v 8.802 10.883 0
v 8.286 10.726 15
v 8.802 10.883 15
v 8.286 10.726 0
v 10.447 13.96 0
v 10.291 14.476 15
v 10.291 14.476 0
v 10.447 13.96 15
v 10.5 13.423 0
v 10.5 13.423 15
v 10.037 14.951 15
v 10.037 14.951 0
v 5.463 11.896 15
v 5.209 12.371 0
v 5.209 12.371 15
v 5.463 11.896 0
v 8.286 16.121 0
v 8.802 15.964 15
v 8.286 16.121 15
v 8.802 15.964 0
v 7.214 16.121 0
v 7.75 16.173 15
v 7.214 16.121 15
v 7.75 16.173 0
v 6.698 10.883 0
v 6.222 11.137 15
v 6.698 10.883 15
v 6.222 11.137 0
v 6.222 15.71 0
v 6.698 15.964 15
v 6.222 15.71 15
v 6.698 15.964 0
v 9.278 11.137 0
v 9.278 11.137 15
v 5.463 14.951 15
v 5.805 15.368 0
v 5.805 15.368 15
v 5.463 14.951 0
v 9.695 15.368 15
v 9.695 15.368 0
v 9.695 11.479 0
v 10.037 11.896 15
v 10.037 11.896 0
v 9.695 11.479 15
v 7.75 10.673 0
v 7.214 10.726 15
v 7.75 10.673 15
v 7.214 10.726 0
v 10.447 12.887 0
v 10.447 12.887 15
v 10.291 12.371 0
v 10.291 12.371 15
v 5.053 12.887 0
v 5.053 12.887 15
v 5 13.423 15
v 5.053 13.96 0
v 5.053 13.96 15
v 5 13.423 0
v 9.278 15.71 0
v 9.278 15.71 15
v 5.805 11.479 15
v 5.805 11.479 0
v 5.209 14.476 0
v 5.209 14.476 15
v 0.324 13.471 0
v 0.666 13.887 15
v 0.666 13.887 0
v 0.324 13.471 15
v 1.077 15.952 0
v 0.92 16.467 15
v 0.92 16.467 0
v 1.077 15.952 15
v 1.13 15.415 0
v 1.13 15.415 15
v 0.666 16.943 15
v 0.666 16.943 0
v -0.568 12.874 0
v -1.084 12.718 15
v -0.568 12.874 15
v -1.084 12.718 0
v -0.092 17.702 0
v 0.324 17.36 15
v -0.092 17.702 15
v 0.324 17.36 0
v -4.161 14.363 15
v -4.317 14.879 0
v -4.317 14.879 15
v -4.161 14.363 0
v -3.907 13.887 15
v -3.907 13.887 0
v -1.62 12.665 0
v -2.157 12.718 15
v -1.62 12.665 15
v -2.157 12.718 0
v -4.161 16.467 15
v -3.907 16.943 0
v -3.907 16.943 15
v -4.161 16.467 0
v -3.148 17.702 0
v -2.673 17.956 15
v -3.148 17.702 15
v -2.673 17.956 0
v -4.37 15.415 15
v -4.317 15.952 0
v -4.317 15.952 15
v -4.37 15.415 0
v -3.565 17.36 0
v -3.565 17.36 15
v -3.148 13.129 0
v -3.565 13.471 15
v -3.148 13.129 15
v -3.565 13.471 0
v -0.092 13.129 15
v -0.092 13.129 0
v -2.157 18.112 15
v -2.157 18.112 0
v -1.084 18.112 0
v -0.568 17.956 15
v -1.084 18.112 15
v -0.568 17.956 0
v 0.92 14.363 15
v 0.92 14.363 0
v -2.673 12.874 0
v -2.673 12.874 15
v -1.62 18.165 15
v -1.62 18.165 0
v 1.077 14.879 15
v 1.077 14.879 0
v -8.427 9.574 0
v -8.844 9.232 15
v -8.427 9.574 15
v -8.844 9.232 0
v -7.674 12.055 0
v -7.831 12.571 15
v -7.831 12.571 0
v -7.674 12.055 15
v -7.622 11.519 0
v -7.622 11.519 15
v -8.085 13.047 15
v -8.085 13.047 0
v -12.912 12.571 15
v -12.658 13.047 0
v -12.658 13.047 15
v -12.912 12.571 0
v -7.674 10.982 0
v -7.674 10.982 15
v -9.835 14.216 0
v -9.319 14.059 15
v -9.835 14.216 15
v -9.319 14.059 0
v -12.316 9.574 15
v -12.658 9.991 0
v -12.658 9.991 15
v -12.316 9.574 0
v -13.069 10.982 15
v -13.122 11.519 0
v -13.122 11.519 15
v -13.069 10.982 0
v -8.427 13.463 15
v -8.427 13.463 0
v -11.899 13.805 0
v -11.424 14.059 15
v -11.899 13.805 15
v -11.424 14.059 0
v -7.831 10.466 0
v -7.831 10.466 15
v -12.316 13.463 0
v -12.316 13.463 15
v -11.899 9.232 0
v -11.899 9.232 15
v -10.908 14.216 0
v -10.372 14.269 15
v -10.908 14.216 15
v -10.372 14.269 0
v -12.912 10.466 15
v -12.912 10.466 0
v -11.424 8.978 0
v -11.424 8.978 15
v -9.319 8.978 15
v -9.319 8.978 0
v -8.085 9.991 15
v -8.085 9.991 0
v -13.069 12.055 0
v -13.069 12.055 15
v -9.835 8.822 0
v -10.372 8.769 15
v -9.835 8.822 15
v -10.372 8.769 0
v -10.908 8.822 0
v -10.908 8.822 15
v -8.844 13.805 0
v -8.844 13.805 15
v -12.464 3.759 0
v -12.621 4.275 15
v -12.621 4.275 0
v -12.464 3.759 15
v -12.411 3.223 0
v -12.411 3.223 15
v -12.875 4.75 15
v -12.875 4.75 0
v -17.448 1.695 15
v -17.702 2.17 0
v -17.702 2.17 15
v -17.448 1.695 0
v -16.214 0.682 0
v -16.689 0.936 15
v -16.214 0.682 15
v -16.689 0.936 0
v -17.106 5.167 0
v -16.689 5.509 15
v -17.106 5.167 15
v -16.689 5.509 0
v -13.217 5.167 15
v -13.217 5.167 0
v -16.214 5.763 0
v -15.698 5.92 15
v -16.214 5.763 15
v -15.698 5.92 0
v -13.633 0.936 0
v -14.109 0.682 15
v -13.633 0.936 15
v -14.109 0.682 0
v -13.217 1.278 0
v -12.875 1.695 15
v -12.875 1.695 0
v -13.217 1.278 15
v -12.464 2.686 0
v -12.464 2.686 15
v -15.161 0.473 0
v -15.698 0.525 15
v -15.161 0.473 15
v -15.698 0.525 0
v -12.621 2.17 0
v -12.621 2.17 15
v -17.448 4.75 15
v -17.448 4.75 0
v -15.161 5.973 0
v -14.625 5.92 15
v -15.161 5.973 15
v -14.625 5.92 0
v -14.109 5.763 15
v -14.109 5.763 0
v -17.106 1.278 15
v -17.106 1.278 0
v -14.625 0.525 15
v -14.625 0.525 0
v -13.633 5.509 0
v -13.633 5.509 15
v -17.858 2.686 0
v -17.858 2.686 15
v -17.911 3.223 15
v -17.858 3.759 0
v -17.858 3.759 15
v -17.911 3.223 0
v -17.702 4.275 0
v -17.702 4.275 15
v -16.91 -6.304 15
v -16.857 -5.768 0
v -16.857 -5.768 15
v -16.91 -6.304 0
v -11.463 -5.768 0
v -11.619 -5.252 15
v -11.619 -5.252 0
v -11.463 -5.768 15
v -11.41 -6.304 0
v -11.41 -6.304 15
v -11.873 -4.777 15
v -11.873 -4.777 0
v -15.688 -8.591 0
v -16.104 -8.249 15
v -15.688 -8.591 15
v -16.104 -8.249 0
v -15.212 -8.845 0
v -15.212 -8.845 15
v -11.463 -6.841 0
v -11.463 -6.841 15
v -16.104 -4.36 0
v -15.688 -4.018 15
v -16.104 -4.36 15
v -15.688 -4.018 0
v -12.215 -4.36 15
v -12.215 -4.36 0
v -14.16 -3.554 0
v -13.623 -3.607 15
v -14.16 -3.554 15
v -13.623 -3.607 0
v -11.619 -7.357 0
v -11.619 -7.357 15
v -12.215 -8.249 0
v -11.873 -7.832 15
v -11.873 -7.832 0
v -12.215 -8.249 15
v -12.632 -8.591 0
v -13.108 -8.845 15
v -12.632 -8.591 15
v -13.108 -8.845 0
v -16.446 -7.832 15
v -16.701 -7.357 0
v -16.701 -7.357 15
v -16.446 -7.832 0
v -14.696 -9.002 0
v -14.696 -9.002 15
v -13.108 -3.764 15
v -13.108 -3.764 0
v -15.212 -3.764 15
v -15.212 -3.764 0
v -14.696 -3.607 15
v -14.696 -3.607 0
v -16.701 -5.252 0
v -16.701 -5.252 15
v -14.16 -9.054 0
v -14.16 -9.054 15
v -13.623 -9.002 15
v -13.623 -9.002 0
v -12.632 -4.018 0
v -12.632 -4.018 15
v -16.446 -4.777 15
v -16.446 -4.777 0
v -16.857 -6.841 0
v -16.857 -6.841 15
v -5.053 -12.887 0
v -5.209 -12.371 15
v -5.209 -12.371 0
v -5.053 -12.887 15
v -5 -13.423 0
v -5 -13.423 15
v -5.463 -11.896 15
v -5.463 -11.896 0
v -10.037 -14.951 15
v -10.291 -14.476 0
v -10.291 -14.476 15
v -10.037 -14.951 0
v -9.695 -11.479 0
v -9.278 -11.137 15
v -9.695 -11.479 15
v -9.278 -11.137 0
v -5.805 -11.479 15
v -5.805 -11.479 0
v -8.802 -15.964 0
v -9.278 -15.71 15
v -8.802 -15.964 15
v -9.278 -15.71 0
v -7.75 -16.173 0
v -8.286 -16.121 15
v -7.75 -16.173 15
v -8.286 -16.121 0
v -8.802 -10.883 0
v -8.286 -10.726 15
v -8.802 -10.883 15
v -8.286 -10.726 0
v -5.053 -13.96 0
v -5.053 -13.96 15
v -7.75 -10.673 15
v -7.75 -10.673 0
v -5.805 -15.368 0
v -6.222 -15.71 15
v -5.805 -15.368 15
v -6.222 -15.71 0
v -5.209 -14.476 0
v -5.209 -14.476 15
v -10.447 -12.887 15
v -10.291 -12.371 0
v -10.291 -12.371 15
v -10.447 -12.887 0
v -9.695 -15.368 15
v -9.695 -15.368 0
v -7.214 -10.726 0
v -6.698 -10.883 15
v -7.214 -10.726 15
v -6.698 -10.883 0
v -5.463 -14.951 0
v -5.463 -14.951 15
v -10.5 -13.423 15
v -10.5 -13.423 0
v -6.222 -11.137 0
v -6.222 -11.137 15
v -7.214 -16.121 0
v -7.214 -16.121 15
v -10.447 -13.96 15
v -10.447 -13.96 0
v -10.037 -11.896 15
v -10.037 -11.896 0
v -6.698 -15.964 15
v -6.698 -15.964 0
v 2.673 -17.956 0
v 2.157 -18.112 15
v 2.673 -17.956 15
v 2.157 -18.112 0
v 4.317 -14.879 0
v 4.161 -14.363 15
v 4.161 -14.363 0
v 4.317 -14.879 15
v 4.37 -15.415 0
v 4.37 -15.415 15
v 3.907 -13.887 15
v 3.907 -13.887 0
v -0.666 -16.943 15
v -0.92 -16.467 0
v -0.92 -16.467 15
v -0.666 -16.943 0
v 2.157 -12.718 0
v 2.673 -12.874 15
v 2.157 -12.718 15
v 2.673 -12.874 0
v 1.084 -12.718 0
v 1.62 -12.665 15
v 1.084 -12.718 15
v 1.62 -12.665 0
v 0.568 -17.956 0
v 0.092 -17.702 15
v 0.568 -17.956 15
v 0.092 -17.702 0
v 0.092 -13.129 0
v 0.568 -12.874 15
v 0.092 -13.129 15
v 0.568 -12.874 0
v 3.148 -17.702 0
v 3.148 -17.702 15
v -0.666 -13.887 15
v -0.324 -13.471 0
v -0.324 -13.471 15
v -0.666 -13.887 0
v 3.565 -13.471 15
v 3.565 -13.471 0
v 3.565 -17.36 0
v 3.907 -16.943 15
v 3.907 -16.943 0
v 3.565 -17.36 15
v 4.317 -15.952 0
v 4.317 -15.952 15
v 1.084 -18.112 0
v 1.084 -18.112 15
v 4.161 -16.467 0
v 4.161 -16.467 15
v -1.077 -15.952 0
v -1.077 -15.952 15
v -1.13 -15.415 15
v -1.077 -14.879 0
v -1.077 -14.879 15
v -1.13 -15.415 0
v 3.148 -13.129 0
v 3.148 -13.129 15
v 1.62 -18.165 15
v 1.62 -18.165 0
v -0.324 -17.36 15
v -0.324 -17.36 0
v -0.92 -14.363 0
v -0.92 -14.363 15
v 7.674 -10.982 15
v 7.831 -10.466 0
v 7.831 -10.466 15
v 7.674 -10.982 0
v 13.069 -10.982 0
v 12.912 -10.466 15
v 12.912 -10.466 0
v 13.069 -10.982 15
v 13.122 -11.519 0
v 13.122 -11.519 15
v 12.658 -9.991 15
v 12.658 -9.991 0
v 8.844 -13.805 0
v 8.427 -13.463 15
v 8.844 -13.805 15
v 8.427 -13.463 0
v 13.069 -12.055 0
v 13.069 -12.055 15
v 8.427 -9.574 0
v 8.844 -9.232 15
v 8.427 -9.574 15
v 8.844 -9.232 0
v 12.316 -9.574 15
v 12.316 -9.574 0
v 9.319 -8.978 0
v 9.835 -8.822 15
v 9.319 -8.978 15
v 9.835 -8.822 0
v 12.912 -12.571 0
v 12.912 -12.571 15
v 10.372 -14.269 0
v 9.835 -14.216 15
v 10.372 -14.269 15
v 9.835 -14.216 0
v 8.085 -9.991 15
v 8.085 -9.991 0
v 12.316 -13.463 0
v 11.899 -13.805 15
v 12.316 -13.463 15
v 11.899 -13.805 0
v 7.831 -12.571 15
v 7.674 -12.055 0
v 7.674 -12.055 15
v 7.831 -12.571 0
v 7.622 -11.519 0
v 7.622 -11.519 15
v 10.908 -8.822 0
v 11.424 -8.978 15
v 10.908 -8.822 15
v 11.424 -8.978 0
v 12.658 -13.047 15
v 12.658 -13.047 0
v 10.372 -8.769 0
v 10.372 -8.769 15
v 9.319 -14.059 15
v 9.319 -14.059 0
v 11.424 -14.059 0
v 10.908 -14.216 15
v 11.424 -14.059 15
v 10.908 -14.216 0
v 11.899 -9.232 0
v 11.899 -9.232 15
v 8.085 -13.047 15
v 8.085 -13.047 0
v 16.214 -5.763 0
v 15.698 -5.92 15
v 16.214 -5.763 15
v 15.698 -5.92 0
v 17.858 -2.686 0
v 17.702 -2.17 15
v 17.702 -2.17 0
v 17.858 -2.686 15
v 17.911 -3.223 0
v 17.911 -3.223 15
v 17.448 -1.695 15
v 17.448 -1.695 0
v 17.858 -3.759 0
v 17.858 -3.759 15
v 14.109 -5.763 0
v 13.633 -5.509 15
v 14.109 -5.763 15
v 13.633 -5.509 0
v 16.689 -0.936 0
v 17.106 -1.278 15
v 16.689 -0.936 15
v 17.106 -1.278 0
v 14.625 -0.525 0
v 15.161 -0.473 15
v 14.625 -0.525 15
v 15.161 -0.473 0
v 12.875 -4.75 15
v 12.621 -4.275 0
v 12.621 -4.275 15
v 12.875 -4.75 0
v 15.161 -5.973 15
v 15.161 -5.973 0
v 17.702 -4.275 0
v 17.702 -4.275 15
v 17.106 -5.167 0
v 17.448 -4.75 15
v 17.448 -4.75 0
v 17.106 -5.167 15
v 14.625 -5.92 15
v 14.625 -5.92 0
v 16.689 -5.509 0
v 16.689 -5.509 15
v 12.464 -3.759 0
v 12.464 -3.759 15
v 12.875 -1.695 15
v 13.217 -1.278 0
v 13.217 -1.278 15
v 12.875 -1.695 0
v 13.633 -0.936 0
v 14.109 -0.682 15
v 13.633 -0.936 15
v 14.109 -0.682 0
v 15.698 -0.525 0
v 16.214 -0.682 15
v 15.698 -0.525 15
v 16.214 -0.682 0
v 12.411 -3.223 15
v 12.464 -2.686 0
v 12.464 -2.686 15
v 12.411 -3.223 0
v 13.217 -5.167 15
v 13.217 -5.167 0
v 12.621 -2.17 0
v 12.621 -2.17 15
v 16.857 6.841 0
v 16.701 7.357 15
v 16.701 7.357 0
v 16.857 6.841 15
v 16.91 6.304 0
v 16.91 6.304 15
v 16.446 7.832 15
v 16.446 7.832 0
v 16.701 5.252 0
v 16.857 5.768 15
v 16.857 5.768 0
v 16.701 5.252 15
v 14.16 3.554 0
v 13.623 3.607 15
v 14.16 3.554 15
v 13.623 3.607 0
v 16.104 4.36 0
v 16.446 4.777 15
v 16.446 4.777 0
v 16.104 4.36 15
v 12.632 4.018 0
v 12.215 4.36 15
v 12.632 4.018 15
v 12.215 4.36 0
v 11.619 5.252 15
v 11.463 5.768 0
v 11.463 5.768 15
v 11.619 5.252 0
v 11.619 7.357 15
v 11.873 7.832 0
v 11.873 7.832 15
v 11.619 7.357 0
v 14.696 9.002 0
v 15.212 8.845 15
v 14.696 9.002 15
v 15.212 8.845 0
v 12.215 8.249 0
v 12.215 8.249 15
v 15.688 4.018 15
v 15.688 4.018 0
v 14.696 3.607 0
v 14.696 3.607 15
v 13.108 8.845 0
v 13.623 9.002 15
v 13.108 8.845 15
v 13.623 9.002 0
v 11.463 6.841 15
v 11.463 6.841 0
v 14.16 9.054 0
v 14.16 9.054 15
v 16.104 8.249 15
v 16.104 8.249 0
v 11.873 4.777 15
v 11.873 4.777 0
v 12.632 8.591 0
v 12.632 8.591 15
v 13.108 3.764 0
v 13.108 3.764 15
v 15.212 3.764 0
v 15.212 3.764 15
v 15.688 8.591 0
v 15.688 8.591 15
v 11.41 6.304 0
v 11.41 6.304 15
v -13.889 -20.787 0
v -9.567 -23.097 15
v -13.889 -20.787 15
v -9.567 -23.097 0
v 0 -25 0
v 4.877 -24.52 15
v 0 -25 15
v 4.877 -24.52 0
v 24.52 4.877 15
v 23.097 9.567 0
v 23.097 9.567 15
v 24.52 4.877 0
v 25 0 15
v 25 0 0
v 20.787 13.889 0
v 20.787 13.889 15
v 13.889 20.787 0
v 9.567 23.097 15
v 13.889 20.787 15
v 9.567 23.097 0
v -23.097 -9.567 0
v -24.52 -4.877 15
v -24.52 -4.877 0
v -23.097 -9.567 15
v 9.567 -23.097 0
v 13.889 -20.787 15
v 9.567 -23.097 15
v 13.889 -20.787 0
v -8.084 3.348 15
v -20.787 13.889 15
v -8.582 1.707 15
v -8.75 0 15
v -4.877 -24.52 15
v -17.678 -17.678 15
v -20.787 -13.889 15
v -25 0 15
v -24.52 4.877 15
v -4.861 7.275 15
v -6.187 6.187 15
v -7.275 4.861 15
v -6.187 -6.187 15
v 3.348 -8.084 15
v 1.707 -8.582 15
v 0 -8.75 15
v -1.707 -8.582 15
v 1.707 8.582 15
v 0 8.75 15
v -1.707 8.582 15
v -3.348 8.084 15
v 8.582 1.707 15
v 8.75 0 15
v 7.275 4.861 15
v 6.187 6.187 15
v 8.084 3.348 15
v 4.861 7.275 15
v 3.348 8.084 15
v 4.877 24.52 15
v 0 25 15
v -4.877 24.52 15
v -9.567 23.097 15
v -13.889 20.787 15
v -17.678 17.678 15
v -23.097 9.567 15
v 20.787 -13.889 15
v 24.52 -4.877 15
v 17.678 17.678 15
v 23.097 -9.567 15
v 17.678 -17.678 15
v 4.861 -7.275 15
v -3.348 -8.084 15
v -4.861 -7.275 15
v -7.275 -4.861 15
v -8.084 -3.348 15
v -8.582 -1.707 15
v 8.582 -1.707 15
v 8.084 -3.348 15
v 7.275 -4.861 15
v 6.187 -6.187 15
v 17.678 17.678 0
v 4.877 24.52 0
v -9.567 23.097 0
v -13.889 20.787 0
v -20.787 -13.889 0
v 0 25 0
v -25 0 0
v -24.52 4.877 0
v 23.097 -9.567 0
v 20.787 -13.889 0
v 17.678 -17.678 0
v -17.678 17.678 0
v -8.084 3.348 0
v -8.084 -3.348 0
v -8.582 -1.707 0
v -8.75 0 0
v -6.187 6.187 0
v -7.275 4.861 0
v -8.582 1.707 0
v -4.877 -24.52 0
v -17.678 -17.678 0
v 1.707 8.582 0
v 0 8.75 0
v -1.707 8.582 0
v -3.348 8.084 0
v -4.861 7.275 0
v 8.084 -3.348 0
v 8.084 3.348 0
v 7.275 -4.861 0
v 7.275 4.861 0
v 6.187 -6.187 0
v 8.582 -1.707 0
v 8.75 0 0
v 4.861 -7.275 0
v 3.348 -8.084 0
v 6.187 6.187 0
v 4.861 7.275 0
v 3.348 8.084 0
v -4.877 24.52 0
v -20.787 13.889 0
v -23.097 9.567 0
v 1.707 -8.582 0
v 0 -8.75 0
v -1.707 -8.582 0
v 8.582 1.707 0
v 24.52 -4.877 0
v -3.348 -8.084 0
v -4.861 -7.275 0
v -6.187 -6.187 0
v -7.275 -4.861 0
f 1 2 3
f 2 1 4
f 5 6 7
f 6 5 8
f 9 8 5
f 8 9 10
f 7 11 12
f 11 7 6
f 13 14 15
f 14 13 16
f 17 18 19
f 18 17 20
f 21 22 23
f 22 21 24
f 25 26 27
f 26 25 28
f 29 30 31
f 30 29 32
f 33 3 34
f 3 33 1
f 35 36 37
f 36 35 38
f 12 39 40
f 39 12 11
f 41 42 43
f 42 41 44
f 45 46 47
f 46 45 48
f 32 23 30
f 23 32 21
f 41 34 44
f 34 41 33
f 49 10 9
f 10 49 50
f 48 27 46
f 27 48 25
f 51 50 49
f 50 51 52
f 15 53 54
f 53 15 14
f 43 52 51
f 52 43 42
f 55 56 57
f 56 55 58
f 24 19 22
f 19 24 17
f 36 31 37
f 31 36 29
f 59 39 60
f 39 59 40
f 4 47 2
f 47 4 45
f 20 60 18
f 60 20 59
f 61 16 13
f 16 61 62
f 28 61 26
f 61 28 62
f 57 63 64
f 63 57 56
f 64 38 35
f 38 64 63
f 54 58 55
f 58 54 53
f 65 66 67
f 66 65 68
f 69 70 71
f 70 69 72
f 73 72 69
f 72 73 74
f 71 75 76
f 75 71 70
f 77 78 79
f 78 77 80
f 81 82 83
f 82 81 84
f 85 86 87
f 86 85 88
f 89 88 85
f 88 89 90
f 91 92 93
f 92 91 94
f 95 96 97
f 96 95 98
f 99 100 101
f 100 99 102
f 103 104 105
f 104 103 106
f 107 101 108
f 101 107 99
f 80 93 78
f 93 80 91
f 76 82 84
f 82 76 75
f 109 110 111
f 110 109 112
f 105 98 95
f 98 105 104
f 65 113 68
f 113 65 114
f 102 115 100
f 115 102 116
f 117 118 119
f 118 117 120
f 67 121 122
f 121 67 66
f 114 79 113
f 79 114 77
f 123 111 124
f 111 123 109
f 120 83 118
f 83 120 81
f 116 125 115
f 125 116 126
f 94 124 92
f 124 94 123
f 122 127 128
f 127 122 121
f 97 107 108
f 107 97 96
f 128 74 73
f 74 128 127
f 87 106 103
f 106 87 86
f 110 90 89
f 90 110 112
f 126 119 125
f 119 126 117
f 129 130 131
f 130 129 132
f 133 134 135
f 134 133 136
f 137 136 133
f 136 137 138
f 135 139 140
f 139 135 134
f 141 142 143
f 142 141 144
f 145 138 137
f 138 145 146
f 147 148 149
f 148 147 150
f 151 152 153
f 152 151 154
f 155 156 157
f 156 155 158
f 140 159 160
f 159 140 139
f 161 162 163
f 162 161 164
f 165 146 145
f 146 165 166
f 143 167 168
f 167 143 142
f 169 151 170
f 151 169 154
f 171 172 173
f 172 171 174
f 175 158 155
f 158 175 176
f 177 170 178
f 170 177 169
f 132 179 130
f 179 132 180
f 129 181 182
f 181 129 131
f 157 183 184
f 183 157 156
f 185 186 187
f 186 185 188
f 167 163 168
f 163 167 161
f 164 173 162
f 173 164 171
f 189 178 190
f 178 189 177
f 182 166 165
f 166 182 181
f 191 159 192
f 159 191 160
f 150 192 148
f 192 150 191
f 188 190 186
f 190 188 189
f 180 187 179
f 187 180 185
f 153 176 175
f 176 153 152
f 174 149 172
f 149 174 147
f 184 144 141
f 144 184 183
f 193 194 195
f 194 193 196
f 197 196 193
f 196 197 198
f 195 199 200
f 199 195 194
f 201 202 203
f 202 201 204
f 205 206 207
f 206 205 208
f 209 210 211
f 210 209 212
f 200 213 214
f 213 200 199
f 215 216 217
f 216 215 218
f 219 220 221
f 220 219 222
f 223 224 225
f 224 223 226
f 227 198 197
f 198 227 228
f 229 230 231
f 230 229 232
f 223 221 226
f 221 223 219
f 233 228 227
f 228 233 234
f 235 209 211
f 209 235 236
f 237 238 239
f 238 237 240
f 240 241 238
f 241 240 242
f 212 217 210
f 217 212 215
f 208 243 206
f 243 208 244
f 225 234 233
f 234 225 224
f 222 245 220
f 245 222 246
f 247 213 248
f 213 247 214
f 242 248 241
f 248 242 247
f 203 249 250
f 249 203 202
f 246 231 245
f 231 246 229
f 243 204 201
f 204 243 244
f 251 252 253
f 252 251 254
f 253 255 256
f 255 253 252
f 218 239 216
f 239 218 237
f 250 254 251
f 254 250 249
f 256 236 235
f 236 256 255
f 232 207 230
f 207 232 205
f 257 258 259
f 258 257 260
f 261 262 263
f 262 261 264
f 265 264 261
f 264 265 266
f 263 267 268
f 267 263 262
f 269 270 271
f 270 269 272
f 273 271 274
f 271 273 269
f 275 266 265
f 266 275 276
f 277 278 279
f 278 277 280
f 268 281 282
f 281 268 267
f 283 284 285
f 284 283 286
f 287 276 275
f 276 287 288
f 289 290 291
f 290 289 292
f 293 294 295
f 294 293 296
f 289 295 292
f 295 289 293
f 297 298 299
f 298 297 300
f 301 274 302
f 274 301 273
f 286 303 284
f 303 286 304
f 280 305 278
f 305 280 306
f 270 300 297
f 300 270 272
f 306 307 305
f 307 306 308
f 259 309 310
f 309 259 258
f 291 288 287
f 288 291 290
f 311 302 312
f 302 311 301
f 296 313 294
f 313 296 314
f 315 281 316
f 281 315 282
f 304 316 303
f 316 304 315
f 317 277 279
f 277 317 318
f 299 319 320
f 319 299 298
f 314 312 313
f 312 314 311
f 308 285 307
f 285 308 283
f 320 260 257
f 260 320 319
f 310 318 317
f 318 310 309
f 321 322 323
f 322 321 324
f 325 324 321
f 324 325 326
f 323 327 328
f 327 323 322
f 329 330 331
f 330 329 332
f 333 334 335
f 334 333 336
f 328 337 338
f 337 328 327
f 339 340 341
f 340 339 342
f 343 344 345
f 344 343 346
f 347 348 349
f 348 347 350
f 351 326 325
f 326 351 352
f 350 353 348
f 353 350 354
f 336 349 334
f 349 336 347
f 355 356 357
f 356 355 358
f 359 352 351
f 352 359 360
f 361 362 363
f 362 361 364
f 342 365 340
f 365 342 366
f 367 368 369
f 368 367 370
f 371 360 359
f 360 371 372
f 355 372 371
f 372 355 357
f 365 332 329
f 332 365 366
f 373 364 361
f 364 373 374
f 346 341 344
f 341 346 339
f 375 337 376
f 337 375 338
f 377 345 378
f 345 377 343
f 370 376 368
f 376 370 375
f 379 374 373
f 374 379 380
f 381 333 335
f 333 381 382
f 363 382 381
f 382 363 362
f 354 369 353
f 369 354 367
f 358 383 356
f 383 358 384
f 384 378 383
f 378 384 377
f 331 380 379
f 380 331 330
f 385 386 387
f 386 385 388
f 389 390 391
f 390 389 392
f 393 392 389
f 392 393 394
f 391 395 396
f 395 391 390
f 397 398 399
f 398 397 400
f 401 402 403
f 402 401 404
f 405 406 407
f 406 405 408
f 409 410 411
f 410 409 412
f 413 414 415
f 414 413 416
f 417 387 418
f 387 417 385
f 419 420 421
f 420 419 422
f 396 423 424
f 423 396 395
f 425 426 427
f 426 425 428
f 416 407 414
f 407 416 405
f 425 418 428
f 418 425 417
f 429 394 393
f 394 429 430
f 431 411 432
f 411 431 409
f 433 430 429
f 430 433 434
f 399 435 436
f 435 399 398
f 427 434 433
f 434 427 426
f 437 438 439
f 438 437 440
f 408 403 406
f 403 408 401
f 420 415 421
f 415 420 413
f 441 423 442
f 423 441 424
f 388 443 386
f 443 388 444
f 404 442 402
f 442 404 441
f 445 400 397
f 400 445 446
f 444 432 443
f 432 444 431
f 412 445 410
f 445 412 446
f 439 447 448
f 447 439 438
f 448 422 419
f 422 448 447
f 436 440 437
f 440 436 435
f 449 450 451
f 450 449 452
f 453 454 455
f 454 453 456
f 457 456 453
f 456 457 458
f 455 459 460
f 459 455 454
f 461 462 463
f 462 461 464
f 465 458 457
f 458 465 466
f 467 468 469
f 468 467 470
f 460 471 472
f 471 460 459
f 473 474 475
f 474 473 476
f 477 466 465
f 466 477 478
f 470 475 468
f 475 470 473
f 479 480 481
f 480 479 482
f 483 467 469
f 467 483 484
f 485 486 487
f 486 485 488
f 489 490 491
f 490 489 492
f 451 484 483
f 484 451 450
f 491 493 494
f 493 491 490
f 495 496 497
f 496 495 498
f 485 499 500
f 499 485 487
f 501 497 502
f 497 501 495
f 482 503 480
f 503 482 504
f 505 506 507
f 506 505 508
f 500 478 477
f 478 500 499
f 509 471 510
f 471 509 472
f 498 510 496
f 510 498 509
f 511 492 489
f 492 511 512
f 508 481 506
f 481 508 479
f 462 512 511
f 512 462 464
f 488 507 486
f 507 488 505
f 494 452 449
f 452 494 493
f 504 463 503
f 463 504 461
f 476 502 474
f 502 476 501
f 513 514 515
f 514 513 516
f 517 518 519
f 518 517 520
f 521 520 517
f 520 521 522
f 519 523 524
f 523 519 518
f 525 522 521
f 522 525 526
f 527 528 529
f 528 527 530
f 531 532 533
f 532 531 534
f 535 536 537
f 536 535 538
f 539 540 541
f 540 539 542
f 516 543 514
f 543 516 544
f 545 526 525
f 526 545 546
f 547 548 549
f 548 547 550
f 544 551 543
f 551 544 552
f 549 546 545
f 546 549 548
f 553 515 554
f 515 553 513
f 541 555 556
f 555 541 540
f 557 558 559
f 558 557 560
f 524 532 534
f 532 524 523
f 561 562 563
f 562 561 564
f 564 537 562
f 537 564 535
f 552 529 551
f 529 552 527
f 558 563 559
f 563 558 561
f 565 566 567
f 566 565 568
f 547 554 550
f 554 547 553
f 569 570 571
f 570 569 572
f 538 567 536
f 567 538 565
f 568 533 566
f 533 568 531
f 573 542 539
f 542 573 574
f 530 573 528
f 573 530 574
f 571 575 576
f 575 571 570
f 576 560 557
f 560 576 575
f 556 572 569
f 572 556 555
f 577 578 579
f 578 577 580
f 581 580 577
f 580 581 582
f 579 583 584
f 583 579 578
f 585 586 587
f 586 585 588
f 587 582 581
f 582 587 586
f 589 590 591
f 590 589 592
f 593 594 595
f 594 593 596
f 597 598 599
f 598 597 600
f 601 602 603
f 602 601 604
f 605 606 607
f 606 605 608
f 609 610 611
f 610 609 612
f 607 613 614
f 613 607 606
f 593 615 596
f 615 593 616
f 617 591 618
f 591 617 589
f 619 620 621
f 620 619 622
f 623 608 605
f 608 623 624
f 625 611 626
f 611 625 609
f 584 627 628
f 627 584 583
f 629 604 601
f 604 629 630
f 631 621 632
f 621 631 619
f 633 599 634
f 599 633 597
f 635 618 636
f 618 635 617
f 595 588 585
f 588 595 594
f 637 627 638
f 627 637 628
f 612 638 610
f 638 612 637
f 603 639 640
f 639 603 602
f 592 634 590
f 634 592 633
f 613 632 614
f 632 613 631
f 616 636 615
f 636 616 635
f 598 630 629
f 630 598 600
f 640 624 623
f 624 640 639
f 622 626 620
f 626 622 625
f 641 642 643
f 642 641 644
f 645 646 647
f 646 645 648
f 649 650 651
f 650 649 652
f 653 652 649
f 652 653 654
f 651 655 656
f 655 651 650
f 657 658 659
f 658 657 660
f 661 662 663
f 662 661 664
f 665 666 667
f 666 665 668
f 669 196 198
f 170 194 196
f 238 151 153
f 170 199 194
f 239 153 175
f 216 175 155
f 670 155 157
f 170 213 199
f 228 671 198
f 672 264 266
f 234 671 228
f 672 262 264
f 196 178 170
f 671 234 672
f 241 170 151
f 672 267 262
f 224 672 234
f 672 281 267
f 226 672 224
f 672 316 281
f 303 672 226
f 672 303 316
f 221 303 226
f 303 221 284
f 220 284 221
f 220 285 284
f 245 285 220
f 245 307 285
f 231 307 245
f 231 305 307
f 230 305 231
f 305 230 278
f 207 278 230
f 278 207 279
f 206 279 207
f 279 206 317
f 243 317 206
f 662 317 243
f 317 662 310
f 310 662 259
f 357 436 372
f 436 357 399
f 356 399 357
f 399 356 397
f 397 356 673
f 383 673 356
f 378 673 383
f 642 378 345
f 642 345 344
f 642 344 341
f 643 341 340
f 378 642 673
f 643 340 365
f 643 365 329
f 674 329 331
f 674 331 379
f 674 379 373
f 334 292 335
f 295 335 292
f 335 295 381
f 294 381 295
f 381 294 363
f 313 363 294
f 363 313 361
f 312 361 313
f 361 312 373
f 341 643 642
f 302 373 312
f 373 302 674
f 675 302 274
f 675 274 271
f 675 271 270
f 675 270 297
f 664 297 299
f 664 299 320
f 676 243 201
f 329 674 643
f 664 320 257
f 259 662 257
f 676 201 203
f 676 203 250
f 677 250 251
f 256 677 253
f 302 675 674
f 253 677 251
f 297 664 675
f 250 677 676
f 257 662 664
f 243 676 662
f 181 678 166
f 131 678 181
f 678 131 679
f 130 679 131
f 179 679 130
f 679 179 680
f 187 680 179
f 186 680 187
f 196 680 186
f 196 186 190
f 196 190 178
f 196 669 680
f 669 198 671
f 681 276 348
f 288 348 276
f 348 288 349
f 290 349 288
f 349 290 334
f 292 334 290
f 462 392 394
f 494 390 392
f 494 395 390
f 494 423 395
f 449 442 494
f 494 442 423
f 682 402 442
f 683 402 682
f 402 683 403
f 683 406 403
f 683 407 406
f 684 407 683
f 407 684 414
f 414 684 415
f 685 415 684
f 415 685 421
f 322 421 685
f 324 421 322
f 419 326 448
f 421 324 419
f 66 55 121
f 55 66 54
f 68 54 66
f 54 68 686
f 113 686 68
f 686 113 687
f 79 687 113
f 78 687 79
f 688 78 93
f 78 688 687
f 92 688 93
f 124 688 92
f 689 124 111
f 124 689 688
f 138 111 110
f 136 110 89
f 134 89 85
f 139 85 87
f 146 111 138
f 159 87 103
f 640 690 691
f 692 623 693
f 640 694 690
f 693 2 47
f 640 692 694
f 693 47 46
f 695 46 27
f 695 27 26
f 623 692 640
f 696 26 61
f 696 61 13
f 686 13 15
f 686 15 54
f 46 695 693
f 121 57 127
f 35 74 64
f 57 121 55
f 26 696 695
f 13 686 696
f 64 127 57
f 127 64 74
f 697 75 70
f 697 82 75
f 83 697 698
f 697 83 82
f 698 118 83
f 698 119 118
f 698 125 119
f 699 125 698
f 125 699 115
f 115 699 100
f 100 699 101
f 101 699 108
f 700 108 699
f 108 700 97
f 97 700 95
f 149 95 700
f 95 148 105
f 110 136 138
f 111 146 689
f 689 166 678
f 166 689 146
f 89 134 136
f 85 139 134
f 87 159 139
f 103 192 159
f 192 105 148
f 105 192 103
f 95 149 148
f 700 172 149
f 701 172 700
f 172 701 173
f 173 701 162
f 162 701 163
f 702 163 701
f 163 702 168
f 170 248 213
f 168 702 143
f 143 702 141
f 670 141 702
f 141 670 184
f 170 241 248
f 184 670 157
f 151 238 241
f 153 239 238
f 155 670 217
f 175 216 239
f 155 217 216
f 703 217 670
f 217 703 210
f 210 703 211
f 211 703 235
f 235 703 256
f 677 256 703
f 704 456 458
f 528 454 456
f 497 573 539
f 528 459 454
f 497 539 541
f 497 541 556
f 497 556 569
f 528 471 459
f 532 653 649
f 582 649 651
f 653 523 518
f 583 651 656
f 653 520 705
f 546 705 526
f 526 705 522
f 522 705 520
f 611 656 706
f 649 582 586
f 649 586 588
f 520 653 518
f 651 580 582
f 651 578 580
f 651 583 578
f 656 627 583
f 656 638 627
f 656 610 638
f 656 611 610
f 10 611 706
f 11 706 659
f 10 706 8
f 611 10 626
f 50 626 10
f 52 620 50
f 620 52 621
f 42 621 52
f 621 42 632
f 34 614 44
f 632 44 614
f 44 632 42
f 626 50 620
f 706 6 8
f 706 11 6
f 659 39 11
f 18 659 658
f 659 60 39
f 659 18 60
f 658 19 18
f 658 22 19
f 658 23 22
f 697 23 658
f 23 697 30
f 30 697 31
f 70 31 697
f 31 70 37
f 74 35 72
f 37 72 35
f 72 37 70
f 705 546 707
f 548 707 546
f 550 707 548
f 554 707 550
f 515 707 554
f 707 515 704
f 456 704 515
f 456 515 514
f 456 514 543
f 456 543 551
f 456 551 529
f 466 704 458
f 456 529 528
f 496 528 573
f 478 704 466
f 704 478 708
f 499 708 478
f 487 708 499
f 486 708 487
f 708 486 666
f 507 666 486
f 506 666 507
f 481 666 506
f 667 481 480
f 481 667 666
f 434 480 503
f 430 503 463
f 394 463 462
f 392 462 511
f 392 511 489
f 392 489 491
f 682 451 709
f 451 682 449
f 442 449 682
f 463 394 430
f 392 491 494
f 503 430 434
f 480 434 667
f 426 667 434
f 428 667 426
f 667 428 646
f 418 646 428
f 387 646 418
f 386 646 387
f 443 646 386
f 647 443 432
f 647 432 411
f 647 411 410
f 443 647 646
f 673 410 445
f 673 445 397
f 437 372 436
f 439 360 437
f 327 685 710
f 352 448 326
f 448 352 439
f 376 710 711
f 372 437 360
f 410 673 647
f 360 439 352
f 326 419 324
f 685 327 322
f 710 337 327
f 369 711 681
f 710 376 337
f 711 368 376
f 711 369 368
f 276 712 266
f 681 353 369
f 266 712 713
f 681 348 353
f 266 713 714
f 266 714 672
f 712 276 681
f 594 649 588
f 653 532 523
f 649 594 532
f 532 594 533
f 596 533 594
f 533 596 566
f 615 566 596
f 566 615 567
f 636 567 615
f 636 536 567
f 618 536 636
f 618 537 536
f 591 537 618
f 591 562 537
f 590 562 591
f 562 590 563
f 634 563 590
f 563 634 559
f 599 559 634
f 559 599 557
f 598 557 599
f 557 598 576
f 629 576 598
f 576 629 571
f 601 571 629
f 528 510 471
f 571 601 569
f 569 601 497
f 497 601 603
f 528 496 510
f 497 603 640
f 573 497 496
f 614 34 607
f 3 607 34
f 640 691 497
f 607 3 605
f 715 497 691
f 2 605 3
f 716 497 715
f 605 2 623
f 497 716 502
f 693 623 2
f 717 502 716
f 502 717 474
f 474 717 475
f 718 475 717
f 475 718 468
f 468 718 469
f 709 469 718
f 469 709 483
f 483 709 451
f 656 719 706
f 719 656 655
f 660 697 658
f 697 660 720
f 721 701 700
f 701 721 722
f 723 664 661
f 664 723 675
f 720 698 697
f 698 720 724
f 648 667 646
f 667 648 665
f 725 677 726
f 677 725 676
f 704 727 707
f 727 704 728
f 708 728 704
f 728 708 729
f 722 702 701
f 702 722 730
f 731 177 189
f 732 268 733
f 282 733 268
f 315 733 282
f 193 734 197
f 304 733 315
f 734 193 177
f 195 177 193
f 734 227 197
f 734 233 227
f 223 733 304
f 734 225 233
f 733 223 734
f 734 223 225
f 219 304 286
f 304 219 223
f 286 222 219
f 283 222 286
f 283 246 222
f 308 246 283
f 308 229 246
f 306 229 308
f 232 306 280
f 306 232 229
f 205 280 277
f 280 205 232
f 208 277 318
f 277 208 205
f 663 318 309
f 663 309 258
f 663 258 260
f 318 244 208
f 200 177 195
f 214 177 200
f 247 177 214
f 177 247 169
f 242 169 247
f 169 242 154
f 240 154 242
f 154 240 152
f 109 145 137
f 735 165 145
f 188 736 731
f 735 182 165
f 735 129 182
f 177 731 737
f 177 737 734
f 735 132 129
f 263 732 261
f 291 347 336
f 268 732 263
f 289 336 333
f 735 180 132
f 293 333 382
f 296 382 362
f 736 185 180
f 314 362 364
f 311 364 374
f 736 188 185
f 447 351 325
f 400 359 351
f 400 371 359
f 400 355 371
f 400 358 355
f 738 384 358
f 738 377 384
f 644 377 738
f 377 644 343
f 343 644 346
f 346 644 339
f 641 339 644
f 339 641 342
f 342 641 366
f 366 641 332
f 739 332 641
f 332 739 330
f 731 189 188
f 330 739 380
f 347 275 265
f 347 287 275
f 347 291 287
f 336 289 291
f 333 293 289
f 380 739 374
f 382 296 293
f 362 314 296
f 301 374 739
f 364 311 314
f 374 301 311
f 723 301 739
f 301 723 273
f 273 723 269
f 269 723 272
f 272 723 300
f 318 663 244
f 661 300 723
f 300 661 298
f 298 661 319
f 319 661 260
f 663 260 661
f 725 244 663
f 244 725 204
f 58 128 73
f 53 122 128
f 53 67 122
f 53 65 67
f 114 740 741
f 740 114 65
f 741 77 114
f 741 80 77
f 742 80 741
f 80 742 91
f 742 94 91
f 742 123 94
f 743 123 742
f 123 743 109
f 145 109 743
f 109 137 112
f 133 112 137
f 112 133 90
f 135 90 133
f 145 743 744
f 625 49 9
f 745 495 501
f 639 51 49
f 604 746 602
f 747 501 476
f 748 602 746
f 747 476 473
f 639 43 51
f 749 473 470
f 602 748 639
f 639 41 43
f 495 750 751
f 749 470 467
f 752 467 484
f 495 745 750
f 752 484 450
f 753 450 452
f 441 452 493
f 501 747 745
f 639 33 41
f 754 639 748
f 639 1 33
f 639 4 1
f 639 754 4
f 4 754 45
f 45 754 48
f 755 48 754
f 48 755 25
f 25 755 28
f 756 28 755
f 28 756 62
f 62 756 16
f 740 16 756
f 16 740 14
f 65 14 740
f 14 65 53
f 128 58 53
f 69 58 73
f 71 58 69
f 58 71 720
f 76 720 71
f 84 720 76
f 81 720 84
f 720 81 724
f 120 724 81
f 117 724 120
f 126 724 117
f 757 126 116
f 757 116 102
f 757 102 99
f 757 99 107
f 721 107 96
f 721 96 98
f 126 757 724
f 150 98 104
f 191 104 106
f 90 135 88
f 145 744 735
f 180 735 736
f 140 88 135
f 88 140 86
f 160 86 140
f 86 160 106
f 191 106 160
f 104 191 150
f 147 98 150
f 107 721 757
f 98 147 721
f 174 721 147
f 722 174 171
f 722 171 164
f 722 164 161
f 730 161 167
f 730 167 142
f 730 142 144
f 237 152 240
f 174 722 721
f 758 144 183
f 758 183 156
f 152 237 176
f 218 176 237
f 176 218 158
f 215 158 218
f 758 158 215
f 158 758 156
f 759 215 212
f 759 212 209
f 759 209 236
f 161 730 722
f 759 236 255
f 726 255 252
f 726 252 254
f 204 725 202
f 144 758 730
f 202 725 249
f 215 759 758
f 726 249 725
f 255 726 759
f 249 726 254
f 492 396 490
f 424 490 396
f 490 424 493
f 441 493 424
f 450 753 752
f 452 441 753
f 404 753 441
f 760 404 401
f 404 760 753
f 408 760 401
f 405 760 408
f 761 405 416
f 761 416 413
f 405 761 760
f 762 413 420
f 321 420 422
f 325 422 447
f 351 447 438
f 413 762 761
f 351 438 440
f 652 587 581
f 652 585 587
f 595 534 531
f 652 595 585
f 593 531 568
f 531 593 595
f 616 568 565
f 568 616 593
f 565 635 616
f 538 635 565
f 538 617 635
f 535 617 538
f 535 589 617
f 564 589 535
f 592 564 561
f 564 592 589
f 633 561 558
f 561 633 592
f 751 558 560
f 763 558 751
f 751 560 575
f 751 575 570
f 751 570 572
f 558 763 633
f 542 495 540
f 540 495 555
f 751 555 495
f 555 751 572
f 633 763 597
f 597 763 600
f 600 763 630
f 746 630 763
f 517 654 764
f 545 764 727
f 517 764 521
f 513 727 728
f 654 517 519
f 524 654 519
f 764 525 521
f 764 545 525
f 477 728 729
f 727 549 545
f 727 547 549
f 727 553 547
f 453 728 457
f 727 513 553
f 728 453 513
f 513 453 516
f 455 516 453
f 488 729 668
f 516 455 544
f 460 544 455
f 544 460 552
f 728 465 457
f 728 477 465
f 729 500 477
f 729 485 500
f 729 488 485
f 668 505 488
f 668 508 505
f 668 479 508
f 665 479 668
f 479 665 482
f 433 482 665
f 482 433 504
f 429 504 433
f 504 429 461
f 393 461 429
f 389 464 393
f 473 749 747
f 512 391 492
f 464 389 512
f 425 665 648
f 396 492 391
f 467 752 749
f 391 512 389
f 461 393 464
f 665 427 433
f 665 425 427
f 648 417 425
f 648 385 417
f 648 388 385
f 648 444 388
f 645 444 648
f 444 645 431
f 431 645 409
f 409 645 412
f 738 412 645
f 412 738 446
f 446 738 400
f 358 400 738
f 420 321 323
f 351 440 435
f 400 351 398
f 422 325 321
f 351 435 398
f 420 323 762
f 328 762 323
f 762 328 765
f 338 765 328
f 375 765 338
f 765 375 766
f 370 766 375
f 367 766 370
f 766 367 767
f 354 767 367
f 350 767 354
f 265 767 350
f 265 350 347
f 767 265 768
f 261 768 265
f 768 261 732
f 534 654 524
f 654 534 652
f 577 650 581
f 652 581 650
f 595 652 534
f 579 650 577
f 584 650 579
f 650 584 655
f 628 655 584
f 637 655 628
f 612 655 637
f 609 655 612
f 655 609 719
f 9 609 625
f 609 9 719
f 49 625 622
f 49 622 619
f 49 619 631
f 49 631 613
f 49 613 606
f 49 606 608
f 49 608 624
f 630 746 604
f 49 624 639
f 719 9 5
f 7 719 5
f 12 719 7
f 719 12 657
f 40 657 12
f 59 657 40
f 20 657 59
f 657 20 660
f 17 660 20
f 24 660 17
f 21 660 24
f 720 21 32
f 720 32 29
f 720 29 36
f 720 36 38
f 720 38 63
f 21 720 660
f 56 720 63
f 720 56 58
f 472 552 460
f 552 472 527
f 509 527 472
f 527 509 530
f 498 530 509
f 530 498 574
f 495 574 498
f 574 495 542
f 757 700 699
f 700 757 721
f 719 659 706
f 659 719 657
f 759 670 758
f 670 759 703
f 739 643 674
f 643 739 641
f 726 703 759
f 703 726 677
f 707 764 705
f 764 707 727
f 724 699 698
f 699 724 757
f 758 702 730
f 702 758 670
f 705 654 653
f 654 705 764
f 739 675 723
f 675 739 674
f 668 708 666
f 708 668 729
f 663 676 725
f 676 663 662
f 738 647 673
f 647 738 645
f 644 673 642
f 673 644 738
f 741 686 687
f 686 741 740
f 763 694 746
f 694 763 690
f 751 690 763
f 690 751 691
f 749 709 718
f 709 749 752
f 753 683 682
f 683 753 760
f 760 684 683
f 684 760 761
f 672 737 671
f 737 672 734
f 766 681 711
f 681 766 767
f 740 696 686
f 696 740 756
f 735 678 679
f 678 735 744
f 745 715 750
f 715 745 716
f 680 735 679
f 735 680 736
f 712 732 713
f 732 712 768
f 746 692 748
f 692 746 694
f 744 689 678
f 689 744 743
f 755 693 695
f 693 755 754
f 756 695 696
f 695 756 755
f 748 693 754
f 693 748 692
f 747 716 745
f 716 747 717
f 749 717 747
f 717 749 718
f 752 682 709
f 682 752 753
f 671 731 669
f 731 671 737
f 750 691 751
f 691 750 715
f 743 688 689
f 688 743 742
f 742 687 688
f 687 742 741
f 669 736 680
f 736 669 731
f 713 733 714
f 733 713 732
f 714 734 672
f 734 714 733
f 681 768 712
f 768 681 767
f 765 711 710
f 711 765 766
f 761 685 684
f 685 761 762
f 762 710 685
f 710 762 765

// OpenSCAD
$fn = 32;

// ----------------------------------------------------------------------
// Flange Ø50 x 15
// 10 holes on a Ø31 bolt circle, bolted joints
// ----------------------------------------------------------------------

// --- parameters (mm) ---
flange_d = 50;   // outside diameter of the flange
thickness = 15;  // flange thickness
holes = 10;      // number of bolt holes
pcd = 31;        // bolt circle diameter
start_deg = 60;  // angle of the first hole, from +X
hole_d = 5.5;    // bolt hole diameter
bore_d = 17.5;   // central through bore
hub_d = 25.5;    // hub outside diameter
hub_h = 0;       // hub height above the flange face (0 = no hub)

// --- derived feature positions (mm) ---
height = thickness + hub_h;  // = 15   overall height of the part
pcd_r = pcd / 2;             // = 15.5   bolt circle radius
hole_step = 360 / holes;     // = 36   angular pitch
feature_centers = [
  [pcd_r * cos(start_deg + 0 * hole_step), pcd_r * sin(start_deg + 0 * hole_step)],
  [pcd_r * cos(start_deg + 1 * hole_step), pcd_r * sin(start_deg + 1 * hole_step)],
  [pcd_r * cos(start_deg + 2 * hole_step), pcd_r * sin(start_deg + 2 * hole_step)],
  [pcd_r * cos(start_deg + 3 * hole_step), pcd_r * sin(start_deg + 3 * hole_step)],
  [pcd_r * cos(start_deg + 4 * hole_step), pcd_r * sin(start_deg + 4 * hole_step)],
  [pcd_r * cos(start_deg + 5 * hole_step), pcd_r * sin(start_deg + 5 * hole_step)],
  [pcd_r * cos(start_deg + 6 * hole_step), pcd_r * sin(start_deg + 6 * hole_step)],
  [pcd_r * cos(start_deg + 7 * hole_step), pcd_r * sin(start_deg + 7 * hole_step)],
  [pcd_r * cos(start_deg + 8 * hole_step), pcd_r * sin(start_deg + 8 * hole_step)],
  [pcd_r * cos(start_deg + 9 * hole_step), pcd_r * sin(start_deg + 9 * hole_step)]
];   // bolt hole centres on the pitch circle

// flange disc, every hole and the bore cut straight through
difference() {
  union() {
    cylinder(d = flange_d, h = thickness);
  }
  translate([0, 0, -1]) cylinder(d = bore_d, h = height + 2);  // bore, through
  for (centre = feature_centers)
    translate([centre[0], centre[1], -1]) cylinder(d = hole_d, h = thickness + 2);
}
